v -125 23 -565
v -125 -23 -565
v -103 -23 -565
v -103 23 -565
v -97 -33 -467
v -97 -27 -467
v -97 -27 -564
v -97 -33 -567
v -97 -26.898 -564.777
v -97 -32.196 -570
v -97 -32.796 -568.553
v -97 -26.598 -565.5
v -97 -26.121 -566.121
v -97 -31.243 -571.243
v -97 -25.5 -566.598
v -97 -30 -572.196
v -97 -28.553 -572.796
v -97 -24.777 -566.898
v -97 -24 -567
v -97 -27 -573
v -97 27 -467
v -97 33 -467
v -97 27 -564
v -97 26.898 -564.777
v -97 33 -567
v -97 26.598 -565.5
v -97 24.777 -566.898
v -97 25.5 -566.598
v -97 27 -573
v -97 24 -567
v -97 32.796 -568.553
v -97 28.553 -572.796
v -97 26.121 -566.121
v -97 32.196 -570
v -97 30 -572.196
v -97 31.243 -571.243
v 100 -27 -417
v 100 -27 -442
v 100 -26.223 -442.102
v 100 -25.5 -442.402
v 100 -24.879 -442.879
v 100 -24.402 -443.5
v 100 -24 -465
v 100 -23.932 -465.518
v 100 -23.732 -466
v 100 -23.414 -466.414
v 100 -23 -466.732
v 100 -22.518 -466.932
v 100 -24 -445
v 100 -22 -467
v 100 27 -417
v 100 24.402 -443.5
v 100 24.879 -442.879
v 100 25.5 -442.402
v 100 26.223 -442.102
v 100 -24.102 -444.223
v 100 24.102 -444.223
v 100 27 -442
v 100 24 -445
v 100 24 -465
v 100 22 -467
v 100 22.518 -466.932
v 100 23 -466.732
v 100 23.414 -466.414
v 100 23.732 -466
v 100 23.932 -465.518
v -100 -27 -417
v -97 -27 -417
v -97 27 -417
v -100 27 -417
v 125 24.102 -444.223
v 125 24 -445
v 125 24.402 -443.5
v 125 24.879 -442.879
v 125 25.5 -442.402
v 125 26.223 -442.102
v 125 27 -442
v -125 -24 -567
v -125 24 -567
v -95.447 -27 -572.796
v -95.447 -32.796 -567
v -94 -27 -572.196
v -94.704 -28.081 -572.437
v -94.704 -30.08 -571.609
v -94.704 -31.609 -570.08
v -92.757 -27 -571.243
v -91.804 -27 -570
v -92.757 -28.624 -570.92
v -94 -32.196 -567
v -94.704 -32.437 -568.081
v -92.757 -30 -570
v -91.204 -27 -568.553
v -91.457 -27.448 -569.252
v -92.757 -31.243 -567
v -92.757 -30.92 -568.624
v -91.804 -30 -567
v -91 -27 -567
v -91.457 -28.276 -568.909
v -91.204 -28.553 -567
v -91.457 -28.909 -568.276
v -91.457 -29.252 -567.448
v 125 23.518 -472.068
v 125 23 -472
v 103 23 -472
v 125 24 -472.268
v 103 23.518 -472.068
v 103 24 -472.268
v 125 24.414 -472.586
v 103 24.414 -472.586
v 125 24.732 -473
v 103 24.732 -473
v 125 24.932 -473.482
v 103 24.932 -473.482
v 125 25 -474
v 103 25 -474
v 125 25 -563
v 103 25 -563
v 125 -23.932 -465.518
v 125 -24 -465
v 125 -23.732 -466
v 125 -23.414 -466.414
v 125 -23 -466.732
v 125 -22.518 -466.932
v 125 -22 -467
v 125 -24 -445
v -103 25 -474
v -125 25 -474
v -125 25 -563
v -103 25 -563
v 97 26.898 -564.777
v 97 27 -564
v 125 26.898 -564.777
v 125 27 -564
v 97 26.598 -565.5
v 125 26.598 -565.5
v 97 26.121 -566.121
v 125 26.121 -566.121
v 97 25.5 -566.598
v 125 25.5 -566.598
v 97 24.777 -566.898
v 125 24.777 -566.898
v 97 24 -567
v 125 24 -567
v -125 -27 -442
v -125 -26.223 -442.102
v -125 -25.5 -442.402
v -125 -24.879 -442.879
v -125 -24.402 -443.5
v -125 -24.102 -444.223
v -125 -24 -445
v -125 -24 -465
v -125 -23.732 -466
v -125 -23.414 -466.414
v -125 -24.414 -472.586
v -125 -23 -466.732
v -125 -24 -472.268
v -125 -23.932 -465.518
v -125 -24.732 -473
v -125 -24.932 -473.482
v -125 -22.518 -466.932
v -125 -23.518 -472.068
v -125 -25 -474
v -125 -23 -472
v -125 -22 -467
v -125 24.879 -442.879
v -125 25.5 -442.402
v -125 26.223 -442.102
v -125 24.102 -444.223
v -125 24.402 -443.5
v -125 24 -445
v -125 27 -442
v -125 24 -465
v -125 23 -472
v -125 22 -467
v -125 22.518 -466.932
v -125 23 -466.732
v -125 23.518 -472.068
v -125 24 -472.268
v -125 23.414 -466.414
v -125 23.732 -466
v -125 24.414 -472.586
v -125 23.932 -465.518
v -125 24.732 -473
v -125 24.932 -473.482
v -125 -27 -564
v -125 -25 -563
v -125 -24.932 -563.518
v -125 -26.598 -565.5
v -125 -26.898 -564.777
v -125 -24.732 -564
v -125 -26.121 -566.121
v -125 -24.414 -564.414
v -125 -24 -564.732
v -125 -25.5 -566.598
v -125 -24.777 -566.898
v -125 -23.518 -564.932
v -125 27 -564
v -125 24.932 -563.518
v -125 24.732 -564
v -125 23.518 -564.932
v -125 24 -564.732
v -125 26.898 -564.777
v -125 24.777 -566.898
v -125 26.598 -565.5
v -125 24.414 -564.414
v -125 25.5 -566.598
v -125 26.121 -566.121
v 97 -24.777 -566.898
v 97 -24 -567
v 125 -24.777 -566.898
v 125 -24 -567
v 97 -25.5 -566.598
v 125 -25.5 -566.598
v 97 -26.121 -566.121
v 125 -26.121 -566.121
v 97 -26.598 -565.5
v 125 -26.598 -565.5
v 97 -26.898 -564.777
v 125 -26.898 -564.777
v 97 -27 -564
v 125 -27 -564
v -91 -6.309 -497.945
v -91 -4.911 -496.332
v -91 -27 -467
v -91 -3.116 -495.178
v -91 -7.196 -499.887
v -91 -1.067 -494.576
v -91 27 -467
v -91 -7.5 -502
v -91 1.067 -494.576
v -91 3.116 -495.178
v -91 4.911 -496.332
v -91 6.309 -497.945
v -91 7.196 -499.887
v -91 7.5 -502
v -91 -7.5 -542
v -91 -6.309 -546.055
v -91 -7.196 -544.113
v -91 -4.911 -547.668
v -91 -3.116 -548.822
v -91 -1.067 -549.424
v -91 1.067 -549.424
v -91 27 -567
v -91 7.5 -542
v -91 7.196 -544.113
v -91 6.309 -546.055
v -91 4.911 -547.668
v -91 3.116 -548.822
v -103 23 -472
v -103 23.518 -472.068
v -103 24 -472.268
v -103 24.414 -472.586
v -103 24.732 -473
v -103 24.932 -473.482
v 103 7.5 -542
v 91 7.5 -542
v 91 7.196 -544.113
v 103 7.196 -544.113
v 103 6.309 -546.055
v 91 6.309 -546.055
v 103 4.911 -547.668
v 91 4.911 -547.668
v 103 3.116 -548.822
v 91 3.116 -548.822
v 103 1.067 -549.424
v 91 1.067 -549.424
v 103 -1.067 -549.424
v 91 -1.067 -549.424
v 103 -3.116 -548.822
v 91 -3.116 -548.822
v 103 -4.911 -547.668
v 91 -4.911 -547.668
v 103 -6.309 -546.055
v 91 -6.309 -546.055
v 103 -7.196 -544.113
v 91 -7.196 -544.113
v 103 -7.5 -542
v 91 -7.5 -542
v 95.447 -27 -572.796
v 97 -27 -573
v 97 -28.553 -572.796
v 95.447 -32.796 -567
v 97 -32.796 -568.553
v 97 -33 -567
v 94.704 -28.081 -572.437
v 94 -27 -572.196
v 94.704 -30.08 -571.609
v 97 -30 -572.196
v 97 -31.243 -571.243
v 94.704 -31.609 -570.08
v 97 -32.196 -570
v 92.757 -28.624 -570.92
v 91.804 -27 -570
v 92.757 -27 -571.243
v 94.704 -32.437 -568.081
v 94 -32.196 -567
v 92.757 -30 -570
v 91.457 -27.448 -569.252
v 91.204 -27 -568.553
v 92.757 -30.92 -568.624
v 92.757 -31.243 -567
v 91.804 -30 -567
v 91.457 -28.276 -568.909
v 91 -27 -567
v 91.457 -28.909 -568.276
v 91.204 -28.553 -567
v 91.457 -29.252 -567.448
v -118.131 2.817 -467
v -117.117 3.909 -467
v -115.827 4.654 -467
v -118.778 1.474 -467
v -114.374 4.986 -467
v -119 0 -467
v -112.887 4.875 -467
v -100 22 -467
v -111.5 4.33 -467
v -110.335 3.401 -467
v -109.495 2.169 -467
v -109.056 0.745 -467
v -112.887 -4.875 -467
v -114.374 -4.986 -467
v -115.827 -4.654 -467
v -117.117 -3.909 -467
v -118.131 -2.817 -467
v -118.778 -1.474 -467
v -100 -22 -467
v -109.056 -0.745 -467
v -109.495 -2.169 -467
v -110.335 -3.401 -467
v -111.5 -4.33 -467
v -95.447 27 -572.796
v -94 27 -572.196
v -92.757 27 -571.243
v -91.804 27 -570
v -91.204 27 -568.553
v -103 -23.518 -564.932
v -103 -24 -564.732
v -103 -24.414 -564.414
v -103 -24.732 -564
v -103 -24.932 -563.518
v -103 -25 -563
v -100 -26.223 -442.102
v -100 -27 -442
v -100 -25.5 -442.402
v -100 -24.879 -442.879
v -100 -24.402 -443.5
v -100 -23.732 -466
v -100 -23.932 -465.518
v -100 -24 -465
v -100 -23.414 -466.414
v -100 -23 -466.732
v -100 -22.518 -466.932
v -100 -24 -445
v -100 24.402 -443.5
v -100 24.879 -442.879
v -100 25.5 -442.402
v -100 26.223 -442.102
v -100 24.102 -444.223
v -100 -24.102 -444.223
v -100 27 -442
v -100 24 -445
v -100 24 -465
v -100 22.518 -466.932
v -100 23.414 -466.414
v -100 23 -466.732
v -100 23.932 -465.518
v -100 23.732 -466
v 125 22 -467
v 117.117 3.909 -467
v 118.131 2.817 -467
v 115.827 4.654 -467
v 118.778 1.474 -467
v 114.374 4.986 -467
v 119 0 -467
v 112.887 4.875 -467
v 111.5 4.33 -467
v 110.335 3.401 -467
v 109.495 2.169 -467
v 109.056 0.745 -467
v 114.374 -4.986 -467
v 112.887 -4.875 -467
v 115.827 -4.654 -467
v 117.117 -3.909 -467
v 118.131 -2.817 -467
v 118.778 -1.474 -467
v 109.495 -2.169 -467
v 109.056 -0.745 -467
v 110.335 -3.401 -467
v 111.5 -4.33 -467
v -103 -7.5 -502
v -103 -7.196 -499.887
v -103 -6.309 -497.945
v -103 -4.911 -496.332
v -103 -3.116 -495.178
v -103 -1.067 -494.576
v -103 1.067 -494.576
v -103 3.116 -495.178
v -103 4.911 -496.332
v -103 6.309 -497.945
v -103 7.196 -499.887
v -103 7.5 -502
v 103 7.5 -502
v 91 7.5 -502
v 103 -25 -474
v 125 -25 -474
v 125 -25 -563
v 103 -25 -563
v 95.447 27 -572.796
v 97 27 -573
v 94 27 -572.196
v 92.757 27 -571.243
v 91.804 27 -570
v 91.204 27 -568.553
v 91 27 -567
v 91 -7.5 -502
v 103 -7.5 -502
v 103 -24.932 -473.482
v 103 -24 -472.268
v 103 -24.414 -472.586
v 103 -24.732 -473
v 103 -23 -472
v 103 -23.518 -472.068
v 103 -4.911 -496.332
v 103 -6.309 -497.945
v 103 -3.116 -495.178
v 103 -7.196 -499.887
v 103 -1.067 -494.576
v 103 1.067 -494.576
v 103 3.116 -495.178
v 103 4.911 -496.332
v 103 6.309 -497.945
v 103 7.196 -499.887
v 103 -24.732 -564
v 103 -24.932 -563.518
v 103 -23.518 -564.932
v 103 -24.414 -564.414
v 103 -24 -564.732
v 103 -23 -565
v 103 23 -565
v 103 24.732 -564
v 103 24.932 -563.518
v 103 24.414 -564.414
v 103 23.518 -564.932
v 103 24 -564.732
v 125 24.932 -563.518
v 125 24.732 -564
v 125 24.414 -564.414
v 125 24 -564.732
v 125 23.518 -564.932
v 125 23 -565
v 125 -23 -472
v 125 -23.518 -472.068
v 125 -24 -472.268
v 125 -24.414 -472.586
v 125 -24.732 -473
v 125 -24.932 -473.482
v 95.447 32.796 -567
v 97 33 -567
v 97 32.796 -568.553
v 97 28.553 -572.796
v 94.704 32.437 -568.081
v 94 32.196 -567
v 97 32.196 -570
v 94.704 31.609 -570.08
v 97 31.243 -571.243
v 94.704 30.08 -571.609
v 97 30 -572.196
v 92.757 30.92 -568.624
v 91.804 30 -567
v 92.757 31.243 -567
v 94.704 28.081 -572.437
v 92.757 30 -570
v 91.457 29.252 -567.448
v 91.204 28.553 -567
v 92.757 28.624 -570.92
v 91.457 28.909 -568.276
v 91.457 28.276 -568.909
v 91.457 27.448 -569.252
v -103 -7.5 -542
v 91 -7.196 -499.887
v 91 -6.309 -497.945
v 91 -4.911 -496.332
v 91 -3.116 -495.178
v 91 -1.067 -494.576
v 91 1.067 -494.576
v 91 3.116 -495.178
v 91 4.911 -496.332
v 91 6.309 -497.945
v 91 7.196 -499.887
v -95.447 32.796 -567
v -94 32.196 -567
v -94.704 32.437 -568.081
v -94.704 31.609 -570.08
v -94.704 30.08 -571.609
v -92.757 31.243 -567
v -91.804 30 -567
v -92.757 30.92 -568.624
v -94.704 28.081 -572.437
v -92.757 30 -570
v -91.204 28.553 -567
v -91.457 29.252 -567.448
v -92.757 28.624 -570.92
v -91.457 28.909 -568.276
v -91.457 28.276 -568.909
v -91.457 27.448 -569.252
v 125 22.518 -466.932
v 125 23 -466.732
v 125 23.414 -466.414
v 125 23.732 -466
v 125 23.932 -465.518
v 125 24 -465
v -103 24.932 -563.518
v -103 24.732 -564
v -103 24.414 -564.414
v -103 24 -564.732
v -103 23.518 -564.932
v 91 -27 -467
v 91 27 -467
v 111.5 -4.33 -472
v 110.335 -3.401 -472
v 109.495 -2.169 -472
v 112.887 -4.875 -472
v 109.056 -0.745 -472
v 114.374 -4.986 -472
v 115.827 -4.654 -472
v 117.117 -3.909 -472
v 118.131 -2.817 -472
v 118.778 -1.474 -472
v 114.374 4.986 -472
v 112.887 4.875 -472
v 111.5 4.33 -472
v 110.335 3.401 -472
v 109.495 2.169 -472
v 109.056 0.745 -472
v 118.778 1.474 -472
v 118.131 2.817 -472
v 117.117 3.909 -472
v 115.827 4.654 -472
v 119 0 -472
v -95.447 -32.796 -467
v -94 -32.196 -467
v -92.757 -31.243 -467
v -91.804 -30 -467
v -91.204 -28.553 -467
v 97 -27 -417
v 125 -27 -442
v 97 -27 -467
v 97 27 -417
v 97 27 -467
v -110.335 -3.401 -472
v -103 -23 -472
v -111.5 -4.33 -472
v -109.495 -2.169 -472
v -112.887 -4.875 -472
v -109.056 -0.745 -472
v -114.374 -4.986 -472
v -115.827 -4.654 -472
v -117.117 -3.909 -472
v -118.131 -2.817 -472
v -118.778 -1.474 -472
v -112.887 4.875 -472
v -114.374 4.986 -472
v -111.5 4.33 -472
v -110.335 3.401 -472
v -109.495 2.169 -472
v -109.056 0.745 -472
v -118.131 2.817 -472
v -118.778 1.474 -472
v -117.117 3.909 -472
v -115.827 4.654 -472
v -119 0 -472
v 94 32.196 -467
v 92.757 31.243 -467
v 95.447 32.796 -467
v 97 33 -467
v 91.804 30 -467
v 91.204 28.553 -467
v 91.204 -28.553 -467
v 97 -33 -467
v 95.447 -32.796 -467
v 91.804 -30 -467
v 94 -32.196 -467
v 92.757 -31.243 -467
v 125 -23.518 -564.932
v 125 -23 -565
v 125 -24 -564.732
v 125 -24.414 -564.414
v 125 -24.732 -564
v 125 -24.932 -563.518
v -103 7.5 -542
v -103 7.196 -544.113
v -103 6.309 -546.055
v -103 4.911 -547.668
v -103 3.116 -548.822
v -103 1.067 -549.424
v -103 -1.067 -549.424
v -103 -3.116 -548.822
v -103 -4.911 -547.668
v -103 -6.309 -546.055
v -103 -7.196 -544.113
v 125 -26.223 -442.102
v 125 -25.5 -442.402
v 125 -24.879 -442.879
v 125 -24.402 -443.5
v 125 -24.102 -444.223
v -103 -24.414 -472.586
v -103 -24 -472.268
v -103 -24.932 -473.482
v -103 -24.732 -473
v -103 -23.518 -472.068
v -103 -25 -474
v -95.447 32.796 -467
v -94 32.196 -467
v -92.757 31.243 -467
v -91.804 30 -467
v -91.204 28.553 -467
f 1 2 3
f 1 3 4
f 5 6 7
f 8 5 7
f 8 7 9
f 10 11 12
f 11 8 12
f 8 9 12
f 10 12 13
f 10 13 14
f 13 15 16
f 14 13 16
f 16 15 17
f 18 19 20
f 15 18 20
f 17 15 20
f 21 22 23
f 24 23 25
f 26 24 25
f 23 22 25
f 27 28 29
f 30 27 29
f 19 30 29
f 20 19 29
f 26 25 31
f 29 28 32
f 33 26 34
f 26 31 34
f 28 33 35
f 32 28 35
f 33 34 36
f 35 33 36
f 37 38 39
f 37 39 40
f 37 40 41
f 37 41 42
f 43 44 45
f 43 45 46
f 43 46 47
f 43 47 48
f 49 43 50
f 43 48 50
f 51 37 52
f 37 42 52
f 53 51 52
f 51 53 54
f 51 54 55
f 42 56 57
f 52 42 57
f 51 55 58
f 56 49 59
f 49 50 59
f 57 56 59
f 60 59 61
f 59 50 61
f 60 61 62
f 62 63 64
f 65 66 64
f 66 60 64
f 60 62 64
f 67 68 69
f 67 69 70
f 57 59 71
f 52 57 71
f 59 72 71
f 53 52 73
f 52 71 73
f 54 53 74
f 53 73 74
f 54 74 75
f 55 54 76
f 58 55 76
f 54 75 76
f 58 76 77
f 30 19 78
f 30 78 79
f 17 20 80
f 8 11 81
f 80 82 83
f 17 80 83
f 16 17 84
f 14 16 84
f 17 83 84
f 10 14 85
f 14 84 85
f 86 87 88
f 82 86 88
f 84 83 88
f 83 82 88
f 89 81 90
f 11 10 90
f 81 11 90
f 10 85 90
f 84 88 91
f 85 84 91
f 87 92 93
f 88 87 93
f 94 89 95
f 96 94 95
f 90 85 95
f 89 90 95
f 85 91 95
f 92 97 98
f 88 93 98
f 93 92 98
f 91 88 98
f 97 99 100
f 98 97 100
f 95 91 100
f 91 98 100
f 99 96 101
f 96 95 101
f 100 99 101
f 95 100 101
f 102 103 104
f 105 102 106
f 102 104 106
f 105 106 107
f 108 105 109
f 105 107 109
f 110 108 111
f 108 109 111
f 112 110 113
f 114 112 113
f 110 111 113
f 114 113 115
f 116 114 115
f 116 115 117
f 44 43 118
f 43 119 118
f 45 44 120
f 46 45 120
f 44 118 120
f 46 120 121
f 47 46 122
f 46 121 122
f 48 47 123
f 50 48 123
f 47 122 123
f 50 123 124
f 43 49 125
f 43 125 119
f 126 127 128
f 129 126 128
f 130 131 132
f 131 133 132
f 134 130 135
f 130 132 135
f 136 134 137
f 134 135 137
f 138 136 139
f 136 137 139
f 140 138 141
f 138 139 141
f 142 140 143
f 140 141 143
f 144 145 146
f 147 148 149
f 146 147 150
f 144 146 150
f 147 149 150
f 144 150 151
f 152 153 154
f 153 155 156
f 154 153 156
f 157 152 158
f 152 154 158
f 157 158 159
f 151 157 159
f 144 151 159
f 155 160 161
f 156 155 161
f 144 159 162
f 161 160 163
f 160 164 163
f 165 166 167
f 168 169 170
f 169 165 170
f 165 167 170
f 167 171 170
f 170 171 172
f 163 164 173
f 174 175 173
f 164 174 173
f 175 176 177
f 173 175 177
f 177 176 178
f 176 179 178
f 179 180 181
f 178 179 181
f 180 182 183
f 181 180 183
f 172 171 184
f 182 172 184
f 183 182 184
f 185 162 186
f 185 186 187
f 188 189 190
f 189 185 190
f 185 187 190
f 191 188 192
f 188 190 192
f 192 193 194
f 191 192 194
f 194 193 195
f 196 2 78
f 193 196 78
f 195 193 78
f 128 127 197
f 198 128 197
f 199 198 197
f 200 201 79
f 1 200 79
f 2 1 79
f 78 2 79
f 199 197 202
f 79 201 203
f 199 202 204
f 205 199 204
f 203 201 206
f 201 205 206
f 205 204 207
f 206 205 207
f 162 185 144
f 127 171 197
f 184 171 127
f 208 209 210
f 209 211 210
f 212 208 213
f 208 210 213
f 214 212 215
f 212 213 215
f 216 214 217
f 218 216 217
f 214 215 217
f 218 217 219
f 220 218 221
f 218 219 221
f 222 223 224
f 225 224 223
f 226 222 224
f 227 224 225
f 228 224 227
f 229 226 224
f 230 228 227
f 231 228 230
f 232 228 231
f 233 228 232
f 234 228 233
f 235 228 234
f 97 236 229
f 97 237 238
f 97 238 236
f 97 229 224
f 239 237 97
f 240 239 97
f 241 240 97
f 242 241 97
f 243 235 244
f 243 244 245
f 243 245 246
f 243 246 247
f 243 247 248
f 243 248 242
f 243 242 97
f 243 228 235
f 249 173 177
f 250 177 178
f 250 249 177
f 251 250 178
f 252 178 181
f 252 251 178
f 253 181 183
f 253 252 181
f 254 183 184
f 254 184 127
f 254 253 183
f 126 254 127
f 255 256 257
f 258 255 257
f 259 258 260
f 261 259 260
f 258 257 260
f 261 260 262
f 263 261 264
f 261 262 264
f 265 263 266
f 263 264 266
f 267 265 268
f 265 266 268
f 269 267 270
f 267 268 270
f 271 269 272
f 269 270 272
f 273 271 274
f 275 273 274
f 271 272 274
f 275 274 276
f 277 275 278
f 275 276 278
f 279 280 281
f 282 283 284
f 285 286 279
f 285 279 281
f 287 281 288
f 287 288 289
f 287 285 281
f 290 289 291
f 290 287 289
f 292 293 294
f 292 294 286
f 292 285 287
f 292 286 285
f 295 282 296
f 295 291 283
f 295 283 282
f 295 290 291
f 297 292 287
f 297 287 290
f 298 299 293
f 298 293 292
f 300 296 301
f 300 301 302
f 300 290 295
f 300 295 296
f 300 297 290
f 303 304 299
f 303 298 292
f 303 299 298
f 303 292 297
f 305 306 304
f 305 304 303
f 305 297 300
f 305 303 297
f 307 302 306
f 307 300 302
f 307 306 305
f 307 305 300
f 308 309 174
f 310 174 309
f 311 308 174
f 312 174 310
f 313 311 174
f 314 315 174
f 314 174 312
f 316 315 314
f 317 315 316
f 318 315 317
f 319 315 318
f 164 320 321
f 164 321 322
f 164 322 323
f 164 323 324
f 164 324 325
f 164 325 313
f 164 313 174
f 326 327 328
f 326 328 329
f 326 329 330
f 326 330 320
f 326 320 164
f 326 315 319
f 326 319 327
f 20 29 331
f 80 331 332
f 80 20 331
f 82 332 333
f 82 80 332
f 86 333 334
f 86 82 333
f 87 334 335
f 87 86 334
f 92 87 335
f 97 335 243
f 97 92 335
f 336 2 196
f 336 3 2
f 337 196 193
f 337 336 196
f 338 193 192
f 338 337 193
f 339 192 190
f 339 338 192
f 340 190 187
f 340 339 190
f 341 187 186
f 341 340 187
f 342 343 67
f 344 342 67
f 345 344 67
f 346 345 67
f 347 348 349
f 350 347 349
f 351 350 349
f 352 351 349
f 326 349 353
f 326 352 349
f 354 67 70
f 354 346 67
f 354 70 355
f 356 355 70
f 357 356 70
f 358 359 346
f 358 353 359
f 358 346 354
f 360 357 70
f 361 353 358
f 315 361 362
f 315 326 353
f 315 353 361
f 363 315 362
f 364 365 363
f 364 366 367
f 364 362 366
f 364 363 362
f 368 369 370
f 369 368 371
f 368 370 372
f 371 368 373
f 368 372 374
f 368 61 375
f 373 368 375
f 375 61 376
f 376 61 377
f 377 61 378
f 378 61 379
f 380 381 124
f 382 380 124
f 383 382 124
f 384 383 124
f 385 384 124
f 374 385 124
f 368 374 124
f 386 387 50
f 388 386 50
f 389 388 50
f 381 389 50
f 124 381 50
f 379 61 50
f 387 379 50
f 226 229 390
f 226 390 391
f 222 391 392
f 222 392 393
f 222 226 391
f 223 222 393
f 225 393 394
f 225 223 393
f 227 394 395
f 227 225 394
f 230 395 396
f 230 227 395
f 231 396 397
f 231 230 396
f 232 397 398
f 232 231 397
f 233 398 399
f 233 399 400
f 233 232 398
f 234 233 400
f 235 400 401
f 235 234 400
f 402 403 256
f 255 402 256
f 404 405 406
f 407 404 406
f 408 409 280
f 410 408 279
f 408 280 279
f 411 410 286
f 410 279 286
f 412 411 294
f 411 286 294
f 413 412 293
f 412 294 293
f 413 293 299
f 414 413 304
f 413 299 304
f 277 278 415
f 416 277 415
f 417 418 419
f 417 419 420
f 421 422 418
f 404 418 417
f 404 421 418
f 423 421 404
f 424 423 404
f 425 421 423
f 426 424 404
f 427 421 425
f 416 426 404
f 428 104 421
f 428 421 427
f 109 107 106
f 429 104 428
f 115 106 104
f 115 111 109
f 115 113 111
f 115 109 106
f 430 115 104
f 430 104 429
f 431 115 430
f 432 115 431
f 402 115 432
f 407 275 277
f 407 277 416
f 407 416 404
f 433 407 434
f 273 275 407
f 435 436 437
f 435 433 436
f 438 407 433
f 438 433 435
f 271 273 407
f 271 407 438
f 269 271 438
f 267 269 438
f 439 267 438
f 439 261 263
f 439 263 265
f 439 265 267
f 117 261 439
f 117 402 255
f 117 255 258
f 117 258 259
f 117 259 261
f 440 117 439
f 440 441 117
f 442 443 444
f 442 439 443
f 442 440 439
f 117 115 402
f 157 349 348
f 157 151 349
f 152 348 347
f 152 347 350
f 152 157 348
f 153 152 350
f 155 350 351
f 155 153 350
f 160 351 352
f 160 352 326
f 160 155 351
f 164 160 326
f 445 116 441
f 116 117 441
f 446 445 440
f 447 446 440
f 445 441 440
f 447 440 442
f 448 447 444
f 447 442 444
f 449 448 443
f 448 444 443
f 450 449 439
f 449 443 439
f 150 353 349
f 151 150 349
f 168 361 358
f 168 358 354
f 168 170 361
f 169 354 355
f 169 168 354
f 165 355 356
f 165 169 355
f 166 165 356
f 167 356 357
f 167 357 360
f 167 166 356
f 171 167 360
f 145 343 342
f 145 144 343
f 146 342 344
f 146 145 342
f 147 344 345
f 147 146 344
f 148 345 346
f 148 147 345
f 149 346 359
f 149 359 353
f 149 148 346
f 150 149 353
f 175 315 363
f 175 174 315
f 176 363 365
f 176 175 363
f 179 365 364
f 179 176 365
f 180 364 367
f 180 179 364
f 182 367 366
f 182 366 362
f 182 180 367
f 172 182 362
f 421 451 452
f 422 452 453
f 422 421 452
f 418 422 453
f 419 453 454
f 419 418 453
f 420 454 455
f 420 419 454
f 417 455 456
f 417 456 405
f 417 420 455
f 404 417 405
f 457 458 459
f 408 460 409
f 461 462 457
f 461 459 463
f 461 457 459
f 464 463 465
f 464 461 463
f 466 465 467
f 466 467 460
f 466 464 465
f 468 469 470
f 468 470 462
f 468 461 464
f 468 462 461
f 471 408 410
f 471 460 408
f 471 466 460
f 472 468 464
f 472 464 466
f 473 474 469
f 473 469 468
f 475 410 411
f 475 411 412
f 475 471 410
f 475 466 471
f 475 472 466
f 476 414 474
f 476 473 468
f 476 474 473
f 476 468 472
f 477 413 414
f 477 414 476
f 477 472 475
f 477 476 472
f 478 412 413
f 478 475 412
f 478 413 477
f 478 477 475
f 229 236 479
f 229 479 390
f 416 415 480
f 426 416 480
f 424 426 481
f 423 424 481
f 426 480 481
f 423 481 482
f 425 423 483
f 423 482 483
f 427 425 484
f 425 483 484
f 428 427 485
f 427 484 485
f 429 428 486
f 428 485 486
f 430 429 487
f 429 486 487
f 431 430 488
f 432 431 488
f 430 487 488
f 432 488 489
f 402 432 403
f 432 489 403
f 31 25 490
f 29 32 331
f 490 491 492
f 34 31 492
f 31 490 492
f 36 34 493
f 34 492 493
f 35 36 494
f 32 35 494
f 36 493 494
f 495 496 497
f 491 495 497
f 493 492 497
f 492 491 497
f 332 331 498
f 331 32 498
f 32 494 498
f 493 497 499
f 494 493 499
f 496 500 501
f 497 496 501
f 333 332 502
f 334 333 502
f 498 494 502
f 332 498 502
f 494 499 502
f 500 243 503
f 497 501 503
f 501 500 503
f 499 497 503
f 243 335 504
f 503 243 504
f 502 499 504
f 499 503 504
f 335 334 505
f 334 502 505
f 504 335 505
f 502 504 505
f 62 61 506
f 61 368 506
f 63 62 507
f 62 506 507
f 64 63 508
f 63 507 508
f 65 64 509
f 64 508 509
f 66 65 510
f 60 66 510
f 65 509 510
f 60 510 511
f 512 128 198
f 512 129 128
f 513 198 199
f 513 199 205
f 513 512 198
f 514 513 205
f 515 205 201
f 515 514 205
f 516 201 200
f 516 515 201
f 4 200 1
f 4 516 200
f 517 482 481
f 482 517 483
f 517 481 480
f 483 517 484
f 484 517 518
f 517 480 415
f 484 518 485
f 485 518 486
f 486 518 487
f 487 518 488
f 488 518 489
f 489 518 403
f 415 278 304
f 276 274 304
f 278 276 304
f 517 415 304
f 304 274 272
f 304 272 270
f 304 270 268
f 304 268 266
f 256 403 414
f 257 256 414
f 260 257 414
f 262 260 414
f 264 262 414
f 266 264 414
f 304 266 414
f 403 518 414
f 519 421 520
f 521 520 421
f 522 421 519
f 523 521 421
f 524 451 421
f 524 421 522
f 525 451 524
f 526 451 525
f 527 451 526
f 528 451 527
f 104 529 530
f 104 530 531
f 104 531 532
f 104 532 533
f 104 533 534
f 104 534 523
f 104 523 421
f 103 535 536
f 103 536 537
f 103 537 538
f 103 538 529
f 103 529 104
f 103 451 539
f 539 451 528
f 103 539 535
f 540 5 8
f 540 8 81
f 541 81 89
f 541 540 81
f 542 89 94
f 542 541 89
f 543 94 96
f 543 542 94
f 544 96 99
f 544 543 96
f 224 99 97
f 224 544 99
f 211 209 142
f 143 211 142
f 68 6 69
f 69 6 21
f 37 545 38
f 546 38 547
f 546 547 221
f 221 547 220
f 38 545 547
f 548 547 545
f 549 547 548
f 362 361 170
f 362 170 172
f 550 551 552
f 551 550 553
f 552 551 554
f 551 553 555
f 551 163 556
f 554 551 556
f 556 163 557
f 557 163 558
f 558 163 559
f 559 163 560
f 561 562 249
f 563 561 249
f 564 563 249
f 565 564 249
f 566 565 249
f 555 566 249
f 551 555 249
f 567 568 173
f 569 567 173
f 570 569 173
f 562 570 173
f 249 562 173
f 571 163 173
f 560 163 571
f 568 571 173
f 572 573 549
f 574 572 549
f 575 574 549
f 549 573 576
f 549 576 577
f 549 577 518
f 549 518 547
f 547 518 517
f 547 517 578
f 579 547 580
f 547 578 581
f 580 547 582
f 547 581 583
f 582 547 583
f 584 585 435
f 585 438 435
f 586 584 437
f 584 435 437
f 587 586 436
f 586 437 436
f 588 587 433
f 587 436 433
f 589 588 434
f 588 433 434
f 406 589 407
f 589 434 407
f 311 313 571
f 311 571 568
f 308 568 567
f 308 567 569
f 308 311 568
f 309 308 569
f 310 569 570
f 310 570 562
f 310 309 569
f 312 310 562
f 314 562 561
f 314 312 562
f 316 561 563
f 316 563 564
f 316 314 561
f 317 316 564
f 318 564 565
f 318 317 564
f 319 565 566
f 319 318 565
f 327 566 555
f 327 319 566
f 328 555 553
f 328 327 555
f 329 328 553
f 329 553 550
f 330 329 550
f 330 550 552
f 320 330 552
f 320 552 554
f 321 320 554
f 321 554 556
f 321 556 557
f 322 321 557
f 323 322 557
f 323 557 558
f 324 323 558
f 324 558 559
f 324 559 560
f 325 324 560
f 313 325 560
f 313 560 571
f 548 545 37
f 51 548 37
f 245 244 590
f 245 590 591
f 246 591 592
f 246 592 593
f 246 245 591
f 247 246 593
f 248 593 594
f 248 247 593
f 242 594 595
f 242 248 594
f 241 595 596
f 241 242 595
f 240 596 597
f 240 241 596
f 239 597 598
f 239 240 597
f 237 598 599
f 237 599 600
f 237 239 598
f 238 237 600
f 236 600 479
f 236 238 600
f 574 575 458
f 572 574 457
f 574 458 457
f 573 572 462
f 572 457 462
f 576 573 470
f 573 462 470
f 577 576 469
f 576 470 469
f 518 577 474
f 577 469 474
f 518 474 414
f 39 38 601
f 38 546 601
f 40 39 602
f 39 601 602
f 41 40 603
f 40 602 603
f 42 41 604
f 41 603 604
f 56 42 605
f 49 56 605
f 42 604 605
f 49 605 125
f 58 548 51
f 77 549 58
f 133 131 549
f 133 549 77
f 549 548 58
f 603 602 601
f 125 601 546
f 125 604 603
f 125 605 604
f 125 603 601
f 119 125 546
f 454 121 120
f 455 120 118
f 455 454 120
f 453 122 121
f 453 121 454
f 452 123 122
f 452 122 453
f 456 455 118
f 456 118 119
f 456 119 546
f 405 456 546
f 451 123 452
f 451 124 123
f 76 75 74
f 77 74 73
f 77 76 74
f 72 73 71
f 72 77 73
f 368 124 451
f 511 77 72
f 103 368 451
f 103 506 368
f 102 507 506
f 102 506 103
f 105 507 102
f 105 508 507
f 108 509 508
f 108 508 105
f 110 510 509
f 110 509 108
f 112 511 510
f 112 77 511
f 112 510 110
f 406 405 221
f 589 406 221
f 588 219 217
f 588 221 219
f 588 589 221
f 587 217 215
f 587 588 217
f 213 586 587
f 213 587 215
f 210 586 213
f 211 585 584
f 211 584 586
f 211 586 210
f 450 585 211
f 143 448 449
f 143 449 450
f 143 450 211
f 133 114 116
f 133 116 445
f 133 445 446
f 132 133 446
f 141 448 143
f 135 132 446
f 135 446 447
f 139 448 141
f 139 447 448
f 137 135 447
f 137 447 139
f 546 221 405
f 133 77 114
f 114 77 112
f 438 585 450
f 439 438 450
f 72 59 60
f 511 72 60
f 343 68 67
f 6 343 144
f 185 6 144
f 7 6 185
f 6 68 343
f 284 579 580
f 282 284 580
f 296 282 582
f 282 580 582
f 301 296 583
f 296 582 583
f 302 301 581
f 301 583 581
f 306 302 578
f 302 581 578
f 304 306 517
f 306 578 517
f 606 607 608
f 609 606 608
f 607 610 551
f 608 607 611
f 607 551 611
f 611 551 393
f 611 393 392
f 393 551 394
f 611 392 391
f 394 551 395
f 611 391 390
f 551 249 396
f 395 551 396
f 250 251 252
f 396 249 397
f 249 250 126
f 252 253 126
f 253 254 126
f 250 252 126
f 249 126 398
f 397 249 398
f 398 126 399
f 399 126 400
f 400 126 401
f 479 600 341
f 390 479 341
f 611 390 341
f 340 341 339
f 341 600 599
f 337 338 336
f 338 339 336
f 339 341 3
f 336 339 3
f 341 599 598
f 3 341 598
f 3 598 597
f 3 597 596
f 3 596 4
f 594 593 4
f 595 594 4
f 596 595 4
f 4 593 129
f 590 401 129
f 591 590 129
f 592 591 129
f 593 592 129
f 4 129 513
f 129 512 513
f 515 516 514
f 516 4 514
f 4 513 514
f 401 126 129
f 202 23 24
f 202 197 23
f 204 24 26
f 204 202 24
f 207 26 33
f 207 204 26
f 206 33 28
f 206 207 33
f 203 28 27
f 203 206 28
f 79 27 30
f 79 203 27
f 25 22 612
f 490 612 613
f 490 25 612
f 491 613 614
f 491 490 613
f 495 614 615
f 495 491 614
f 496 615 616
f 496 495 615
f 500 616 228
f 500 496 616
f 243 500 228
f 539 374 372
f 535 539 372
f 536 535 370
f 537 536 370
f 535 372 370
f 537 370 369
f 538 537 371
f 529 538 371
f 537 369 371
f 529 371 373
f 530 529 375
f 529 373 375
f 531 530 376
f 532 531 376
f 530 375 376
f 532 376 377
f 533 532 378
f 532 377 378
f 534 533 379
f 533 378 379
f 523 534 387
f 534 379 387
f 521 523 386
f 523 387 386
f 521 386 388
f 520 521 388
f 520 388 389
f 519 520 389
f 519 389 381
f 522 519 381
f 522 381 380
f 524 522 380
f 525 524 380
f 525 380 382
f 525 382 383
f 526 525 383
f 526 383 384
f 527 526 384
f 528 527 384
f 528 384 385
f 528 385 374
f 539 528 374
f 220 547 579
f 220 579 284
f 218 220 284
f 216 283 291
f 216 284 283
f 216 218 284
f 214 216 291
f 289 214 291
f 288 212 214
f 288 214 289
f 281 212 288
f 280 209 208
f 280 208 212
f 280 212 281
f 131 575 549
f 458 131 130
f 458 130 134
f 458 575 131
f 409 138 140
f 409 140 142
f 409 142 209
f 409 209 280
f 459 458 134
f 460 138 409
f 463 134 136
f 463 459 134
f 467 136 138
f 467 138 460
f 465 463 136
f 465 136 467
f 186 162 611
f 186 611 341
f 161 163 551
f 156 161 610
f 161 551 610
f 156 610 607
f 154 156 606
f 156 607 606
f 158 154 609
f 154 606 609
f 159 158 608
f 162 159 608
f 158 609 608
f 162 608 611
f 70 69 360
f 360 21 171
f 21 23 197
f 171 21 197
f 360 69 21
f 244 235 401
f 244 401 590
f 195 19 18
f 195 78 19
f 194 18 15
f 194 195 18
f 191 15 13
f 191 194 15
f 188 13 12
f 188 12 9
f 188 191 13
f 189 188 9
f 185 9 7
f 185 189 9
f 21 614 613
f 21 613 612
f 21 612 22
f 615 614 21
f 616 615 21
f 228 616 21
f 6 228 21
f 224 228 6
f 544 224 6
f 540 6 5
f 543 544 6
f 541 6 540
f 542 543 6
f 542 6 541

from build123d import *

# Parameters (mm, degrees)
DODANIE_WYCI_GNI_CIE1_START = 91
SZKIC12_W                   = 100
SZKIC12_H                   = 54
DODANIE_WYCI_GNI_CIE1_DEPTH = 34
DODANIE_WYCI_GNI_CIE4_START = 91
DODANIE_WYCI_GNI_CIE4_DEPTH = 6
SZKIC15_W                   = 93
SZKIC15_H                   = 50
WYTNIJ_WYCI_GNI_CIE1_DEPTH  = 22
WYTNIJ_WYCI_GNI_CIE2_REACH  = 169.183
SZKIC16_R                   = 5
SZKIC16_3_W                 = 3
SZKIC16_3_H                 = 54
DODANIE_WYCI_GNI_CIE2_DEPTH = 50
SZKIC18_W                   = 25
SZKIC18_H                   = 3
DODANIE_WYCI_GNI_CIE3_DEPTH = 25
ZAOKR_GLENIE9_R             = 3
ZAOKR_GLENIE8_R             = 2
ZAOKR_GLENIE10_R            = 6


# Some blends are built 0.0001 mm under size
with BuildPart() as part:
    # Szkic12 → Dodanie-wyciągnięcie1 (new body)
    with BuildSketch(Plane(origin=(0, 0, 0), x_dir=(0, 0, -1), z_dir=(1, 0, 0)).offset(DODANIE_WYCI_GNI_CIE1_START)):
        with Locations((517, 0)):
            Rectangle(SZKIC12_W, SZKIC12_H)
        with BuildLine():
            Line((502, 7.5), (542, 7.5))
            ThreePointArc((542, 7.5), (549.5, 0), (542, -7.5))
            Line((542, -7.5), (502, -7.5))
            ThreePointArc((502, -7.5), (494.5, 0), (502, 7.5))
        make_face(mode=Mode.SUBTRACT)
    extrude(amount=DODANIE_WYCI_GNI_CIE1_DEPTH)

    # Szkic12<4> → Dodanie-wyciągnięcie4 (add)
    with BuildSketch(Plane(origin=(0, 0, 0), x_dir=(0, 0, -1), z_dir=(1, 0, 0)).offset(DODANIE_WYCI_GNI_CIE4_START)):
        Polygon((467, -27), (467, -33), (573, -33), (573, 33), (467, 33), (467, 27), (567, 27), (567, -27), align=None)
    extrude(amount=DODANIE_WYCI_GNI_CIE4_DEPTH)

    # Szkic15 → Wytnij-wyciągnięcie1 (cut)
    with BuildSketch(Plane(origin=(125, 0, 0), x_dir=(0, 0, -1), z_dir=(1, 0, 0))):
        with Locations((518.5, 0)):
            Rectangle(SZKIC15_W, SZKIC15_H)
    extrude(amount=-WYTNIJ_WYCI_GNI_CIE1_DEPTH, mode=Mode.SUBTRACT)

    # Szkic16 → Wytnij-wyciągnięcie2 (cut, up to next)
    with BuildSketch(Plane.XY.offset(-467), mode=Mode.PRIVATE) as wytnij_wyci_gni_cie2_sk1:
        with Locations((114, 0)):
            Circle(SZKIC16_R)
    wytnij_wyci_gni_cie2_tool1 = extrude(wytnij_wyci_gni_cie2_sk1.sketch, amount=-WYTNIJ_WYCI_GNI_CIE2_REACH, mode=Mode.PRIVATE) & part.part
    add(wytnij_wyci_gni_cie2_tool1.solids().sort_by_distance((114, 0, -467))[0], mode=Mode.SUBTRACT)

    # Szkic16<3> → Dodanie-wyciągnięcie2 (add)
    with BuildSketch(Plane.XY.offset(-467)):
        with Locations((98.5, 0)):
            Rectangle(SZKIC16_3_W, SZKIC16_3_H)
    extrude(amount=DODANIE_WYCI_GNI_CIE2_DEPTH)

    # Szkic18 → Dodanie-wyciągnięcie3 (add)
    with BuildSketch(Plane(origin=(100, 0, 0), x_dir=(0, 0, -1), z_dir=(1, 0, 0))):
        with Locations((454.5, -25.5)):
            Rectangle(SZKIC18_W, SZKIC18_H)
        with Locations((454.5, 25.5)):
            Rectangle(SZKIC18_W, SZKIC18_H)
    extrude(amount=DODANIE_WYCI_GNI_CIE3_DEPTH)

    # Zaokrąglenie9
    zaokr_glenie9_edges = [part.edges().sort_by_distance(p)[0] for p in [
        (111, -27, -567),
        (111, 27, -567),
        (112.5, -24, -442),
        (112.5, 24, -442),
    ]]
    fillet(zaokr_glenie9_edges, radius=ZAOKR_GLENIE9_R - 0.0001)  # a hair under: the kernel refuses the full size

    # Zaokrąglenie8
    zaokr_glenie8_edges = [part.edges().sort_by_distance(p)[0] for p in [
        (112.5, -24, -467),
        (114, -25, -472),
        (114, 25, -472),
        (114, 25, -565),
        (114, -25, -565),
        (112.5, 24, -467),
    ]]
    fillet(zaokr_glenie8_edges, radius=ZAOKR_GLENIE8_R)

    # Zaokrąglenie10
    # the kernel refuses this fillet: 6 mm, written as the material it takes off along each edge
    with BuildSketch(Plane(origin=(97, 27, -567), x_dir=(0, 1, 0), z_dir=(-1, 0, 0))) as zaokr_glenie10_piece_1_section:
        Polygon((0, 0), (ZAOKR_GLENIE10_R * 1.02, 0), (ZAOKR_GLENIE10_R * 1.02, ZAOKR_GLENIE10_R * 1.02), (0, ZAOKR_GLENIE10_R * 1.02), align=None)
    zaokr_glenie10_piece_1 = extrude(amount=ZAOKR_GLENIE10_R * 1.02, mode=Mode.PRIVATE)
    zaokr_glenie10_piece_1 = zaokr_glenie10_piece_1 - Plane(origin=(97, 27, -567), x_dir=(0, -0.7071067811865475, 0.7071067811865477), z_dir=(-1, 0, 0)) * Sphere(ZAOKR_GLENIE10_R, mode=Mode.PRIVATE)
    add(zaokr_glenie10_piece_1, mode=Mode.SUBTRACT)
    with BuildSketch(Plane(origin=(97, -27, -567), x_dir=(0, 0, -1), z_dir=(-1, 0, 0))) as zaokr_glenie10_piece_2_section:
        Polygon((0, 0), (ZAOKR_GLENIE10_R * 1.02, 0), (ZAOKR_GLENIE10_R * 1.02, ZAOKR_GLENIE10_R * 1.02), (0, ZAOKR_GLENIE10_R * 1.02), align=None)
    zaokr_glenie10_piece_2 = extrude(amount=ZAOKR_GLENIE10_R * 1.02, mode=Mode.PRIVATE)
    zaokr_glenie10_piece_2 = zaokr_glenie10_piece_2 - Plane(origin=(97, -27, -567), x_dir=(0, 0.7071067811865475, 0.7071067811865475), z_dir=(-1, 0, 0)) * Sphere(ZAOKR_GLENIE10_R, mode=Mode.PRIVATE)
    add(zaokr_glenie10_piece_2, mode=Mode.SUBTRACT)
    with BuildSketch(Plane(origin=(91, -33, -452), x_dir=(1, 0, 0), z_dir=(0, 0, -1)), Plane(origin=(91, 33, -567), x_dir=(1, 0, 0), z_dir=(0, 0, 1))) as zaokr_glenie10_piece_3:
        with BuildLine():
            CenterArc((ZAOKR_GLENIE10_R, -ZAOKR_GLENIE10_R), ZAOKR_GLENIE10_R, 90, 90)
            Line((0, -ZAOKR_GLENIE10_R), (0, 0))
            Line((0, 0), (ZAOKR_GLENIE10_R, 0))
        make_face()
    extrude(amount=115, mode=Mode.SUBTRACT)
    with BuildSketch(Plane(origin=(91, -27, -573), x_dir=(1, 0, 0), z_dir=(0, 1, 0))) as zaokr_glenie10_piece_4:
        with BuildLine():
            CenterArc((ZAOKR_GLENIE10_R, -ZAOKR_GLENIE10_R), ZAOKR_GLENIE10_R, 90, 90)
            Line((0, -ZAOKR_GLENIE10_R), (0, 0))
            Line((0, 0), (ZAOKR_GLENIE10_R, 0))
        make_face()
    extrude(amount=54, mode=Mode.SUBTRACT)


with BuildPart() as body_2:
    # Lustro5: mirrored copy
    add(part.part.mirror(Plane(origin=(0, 0, 0), x_dir=(0, 0, 1), z_dir=(1, 0, 0))))


solid = Compound([part.part, body_2.part])
